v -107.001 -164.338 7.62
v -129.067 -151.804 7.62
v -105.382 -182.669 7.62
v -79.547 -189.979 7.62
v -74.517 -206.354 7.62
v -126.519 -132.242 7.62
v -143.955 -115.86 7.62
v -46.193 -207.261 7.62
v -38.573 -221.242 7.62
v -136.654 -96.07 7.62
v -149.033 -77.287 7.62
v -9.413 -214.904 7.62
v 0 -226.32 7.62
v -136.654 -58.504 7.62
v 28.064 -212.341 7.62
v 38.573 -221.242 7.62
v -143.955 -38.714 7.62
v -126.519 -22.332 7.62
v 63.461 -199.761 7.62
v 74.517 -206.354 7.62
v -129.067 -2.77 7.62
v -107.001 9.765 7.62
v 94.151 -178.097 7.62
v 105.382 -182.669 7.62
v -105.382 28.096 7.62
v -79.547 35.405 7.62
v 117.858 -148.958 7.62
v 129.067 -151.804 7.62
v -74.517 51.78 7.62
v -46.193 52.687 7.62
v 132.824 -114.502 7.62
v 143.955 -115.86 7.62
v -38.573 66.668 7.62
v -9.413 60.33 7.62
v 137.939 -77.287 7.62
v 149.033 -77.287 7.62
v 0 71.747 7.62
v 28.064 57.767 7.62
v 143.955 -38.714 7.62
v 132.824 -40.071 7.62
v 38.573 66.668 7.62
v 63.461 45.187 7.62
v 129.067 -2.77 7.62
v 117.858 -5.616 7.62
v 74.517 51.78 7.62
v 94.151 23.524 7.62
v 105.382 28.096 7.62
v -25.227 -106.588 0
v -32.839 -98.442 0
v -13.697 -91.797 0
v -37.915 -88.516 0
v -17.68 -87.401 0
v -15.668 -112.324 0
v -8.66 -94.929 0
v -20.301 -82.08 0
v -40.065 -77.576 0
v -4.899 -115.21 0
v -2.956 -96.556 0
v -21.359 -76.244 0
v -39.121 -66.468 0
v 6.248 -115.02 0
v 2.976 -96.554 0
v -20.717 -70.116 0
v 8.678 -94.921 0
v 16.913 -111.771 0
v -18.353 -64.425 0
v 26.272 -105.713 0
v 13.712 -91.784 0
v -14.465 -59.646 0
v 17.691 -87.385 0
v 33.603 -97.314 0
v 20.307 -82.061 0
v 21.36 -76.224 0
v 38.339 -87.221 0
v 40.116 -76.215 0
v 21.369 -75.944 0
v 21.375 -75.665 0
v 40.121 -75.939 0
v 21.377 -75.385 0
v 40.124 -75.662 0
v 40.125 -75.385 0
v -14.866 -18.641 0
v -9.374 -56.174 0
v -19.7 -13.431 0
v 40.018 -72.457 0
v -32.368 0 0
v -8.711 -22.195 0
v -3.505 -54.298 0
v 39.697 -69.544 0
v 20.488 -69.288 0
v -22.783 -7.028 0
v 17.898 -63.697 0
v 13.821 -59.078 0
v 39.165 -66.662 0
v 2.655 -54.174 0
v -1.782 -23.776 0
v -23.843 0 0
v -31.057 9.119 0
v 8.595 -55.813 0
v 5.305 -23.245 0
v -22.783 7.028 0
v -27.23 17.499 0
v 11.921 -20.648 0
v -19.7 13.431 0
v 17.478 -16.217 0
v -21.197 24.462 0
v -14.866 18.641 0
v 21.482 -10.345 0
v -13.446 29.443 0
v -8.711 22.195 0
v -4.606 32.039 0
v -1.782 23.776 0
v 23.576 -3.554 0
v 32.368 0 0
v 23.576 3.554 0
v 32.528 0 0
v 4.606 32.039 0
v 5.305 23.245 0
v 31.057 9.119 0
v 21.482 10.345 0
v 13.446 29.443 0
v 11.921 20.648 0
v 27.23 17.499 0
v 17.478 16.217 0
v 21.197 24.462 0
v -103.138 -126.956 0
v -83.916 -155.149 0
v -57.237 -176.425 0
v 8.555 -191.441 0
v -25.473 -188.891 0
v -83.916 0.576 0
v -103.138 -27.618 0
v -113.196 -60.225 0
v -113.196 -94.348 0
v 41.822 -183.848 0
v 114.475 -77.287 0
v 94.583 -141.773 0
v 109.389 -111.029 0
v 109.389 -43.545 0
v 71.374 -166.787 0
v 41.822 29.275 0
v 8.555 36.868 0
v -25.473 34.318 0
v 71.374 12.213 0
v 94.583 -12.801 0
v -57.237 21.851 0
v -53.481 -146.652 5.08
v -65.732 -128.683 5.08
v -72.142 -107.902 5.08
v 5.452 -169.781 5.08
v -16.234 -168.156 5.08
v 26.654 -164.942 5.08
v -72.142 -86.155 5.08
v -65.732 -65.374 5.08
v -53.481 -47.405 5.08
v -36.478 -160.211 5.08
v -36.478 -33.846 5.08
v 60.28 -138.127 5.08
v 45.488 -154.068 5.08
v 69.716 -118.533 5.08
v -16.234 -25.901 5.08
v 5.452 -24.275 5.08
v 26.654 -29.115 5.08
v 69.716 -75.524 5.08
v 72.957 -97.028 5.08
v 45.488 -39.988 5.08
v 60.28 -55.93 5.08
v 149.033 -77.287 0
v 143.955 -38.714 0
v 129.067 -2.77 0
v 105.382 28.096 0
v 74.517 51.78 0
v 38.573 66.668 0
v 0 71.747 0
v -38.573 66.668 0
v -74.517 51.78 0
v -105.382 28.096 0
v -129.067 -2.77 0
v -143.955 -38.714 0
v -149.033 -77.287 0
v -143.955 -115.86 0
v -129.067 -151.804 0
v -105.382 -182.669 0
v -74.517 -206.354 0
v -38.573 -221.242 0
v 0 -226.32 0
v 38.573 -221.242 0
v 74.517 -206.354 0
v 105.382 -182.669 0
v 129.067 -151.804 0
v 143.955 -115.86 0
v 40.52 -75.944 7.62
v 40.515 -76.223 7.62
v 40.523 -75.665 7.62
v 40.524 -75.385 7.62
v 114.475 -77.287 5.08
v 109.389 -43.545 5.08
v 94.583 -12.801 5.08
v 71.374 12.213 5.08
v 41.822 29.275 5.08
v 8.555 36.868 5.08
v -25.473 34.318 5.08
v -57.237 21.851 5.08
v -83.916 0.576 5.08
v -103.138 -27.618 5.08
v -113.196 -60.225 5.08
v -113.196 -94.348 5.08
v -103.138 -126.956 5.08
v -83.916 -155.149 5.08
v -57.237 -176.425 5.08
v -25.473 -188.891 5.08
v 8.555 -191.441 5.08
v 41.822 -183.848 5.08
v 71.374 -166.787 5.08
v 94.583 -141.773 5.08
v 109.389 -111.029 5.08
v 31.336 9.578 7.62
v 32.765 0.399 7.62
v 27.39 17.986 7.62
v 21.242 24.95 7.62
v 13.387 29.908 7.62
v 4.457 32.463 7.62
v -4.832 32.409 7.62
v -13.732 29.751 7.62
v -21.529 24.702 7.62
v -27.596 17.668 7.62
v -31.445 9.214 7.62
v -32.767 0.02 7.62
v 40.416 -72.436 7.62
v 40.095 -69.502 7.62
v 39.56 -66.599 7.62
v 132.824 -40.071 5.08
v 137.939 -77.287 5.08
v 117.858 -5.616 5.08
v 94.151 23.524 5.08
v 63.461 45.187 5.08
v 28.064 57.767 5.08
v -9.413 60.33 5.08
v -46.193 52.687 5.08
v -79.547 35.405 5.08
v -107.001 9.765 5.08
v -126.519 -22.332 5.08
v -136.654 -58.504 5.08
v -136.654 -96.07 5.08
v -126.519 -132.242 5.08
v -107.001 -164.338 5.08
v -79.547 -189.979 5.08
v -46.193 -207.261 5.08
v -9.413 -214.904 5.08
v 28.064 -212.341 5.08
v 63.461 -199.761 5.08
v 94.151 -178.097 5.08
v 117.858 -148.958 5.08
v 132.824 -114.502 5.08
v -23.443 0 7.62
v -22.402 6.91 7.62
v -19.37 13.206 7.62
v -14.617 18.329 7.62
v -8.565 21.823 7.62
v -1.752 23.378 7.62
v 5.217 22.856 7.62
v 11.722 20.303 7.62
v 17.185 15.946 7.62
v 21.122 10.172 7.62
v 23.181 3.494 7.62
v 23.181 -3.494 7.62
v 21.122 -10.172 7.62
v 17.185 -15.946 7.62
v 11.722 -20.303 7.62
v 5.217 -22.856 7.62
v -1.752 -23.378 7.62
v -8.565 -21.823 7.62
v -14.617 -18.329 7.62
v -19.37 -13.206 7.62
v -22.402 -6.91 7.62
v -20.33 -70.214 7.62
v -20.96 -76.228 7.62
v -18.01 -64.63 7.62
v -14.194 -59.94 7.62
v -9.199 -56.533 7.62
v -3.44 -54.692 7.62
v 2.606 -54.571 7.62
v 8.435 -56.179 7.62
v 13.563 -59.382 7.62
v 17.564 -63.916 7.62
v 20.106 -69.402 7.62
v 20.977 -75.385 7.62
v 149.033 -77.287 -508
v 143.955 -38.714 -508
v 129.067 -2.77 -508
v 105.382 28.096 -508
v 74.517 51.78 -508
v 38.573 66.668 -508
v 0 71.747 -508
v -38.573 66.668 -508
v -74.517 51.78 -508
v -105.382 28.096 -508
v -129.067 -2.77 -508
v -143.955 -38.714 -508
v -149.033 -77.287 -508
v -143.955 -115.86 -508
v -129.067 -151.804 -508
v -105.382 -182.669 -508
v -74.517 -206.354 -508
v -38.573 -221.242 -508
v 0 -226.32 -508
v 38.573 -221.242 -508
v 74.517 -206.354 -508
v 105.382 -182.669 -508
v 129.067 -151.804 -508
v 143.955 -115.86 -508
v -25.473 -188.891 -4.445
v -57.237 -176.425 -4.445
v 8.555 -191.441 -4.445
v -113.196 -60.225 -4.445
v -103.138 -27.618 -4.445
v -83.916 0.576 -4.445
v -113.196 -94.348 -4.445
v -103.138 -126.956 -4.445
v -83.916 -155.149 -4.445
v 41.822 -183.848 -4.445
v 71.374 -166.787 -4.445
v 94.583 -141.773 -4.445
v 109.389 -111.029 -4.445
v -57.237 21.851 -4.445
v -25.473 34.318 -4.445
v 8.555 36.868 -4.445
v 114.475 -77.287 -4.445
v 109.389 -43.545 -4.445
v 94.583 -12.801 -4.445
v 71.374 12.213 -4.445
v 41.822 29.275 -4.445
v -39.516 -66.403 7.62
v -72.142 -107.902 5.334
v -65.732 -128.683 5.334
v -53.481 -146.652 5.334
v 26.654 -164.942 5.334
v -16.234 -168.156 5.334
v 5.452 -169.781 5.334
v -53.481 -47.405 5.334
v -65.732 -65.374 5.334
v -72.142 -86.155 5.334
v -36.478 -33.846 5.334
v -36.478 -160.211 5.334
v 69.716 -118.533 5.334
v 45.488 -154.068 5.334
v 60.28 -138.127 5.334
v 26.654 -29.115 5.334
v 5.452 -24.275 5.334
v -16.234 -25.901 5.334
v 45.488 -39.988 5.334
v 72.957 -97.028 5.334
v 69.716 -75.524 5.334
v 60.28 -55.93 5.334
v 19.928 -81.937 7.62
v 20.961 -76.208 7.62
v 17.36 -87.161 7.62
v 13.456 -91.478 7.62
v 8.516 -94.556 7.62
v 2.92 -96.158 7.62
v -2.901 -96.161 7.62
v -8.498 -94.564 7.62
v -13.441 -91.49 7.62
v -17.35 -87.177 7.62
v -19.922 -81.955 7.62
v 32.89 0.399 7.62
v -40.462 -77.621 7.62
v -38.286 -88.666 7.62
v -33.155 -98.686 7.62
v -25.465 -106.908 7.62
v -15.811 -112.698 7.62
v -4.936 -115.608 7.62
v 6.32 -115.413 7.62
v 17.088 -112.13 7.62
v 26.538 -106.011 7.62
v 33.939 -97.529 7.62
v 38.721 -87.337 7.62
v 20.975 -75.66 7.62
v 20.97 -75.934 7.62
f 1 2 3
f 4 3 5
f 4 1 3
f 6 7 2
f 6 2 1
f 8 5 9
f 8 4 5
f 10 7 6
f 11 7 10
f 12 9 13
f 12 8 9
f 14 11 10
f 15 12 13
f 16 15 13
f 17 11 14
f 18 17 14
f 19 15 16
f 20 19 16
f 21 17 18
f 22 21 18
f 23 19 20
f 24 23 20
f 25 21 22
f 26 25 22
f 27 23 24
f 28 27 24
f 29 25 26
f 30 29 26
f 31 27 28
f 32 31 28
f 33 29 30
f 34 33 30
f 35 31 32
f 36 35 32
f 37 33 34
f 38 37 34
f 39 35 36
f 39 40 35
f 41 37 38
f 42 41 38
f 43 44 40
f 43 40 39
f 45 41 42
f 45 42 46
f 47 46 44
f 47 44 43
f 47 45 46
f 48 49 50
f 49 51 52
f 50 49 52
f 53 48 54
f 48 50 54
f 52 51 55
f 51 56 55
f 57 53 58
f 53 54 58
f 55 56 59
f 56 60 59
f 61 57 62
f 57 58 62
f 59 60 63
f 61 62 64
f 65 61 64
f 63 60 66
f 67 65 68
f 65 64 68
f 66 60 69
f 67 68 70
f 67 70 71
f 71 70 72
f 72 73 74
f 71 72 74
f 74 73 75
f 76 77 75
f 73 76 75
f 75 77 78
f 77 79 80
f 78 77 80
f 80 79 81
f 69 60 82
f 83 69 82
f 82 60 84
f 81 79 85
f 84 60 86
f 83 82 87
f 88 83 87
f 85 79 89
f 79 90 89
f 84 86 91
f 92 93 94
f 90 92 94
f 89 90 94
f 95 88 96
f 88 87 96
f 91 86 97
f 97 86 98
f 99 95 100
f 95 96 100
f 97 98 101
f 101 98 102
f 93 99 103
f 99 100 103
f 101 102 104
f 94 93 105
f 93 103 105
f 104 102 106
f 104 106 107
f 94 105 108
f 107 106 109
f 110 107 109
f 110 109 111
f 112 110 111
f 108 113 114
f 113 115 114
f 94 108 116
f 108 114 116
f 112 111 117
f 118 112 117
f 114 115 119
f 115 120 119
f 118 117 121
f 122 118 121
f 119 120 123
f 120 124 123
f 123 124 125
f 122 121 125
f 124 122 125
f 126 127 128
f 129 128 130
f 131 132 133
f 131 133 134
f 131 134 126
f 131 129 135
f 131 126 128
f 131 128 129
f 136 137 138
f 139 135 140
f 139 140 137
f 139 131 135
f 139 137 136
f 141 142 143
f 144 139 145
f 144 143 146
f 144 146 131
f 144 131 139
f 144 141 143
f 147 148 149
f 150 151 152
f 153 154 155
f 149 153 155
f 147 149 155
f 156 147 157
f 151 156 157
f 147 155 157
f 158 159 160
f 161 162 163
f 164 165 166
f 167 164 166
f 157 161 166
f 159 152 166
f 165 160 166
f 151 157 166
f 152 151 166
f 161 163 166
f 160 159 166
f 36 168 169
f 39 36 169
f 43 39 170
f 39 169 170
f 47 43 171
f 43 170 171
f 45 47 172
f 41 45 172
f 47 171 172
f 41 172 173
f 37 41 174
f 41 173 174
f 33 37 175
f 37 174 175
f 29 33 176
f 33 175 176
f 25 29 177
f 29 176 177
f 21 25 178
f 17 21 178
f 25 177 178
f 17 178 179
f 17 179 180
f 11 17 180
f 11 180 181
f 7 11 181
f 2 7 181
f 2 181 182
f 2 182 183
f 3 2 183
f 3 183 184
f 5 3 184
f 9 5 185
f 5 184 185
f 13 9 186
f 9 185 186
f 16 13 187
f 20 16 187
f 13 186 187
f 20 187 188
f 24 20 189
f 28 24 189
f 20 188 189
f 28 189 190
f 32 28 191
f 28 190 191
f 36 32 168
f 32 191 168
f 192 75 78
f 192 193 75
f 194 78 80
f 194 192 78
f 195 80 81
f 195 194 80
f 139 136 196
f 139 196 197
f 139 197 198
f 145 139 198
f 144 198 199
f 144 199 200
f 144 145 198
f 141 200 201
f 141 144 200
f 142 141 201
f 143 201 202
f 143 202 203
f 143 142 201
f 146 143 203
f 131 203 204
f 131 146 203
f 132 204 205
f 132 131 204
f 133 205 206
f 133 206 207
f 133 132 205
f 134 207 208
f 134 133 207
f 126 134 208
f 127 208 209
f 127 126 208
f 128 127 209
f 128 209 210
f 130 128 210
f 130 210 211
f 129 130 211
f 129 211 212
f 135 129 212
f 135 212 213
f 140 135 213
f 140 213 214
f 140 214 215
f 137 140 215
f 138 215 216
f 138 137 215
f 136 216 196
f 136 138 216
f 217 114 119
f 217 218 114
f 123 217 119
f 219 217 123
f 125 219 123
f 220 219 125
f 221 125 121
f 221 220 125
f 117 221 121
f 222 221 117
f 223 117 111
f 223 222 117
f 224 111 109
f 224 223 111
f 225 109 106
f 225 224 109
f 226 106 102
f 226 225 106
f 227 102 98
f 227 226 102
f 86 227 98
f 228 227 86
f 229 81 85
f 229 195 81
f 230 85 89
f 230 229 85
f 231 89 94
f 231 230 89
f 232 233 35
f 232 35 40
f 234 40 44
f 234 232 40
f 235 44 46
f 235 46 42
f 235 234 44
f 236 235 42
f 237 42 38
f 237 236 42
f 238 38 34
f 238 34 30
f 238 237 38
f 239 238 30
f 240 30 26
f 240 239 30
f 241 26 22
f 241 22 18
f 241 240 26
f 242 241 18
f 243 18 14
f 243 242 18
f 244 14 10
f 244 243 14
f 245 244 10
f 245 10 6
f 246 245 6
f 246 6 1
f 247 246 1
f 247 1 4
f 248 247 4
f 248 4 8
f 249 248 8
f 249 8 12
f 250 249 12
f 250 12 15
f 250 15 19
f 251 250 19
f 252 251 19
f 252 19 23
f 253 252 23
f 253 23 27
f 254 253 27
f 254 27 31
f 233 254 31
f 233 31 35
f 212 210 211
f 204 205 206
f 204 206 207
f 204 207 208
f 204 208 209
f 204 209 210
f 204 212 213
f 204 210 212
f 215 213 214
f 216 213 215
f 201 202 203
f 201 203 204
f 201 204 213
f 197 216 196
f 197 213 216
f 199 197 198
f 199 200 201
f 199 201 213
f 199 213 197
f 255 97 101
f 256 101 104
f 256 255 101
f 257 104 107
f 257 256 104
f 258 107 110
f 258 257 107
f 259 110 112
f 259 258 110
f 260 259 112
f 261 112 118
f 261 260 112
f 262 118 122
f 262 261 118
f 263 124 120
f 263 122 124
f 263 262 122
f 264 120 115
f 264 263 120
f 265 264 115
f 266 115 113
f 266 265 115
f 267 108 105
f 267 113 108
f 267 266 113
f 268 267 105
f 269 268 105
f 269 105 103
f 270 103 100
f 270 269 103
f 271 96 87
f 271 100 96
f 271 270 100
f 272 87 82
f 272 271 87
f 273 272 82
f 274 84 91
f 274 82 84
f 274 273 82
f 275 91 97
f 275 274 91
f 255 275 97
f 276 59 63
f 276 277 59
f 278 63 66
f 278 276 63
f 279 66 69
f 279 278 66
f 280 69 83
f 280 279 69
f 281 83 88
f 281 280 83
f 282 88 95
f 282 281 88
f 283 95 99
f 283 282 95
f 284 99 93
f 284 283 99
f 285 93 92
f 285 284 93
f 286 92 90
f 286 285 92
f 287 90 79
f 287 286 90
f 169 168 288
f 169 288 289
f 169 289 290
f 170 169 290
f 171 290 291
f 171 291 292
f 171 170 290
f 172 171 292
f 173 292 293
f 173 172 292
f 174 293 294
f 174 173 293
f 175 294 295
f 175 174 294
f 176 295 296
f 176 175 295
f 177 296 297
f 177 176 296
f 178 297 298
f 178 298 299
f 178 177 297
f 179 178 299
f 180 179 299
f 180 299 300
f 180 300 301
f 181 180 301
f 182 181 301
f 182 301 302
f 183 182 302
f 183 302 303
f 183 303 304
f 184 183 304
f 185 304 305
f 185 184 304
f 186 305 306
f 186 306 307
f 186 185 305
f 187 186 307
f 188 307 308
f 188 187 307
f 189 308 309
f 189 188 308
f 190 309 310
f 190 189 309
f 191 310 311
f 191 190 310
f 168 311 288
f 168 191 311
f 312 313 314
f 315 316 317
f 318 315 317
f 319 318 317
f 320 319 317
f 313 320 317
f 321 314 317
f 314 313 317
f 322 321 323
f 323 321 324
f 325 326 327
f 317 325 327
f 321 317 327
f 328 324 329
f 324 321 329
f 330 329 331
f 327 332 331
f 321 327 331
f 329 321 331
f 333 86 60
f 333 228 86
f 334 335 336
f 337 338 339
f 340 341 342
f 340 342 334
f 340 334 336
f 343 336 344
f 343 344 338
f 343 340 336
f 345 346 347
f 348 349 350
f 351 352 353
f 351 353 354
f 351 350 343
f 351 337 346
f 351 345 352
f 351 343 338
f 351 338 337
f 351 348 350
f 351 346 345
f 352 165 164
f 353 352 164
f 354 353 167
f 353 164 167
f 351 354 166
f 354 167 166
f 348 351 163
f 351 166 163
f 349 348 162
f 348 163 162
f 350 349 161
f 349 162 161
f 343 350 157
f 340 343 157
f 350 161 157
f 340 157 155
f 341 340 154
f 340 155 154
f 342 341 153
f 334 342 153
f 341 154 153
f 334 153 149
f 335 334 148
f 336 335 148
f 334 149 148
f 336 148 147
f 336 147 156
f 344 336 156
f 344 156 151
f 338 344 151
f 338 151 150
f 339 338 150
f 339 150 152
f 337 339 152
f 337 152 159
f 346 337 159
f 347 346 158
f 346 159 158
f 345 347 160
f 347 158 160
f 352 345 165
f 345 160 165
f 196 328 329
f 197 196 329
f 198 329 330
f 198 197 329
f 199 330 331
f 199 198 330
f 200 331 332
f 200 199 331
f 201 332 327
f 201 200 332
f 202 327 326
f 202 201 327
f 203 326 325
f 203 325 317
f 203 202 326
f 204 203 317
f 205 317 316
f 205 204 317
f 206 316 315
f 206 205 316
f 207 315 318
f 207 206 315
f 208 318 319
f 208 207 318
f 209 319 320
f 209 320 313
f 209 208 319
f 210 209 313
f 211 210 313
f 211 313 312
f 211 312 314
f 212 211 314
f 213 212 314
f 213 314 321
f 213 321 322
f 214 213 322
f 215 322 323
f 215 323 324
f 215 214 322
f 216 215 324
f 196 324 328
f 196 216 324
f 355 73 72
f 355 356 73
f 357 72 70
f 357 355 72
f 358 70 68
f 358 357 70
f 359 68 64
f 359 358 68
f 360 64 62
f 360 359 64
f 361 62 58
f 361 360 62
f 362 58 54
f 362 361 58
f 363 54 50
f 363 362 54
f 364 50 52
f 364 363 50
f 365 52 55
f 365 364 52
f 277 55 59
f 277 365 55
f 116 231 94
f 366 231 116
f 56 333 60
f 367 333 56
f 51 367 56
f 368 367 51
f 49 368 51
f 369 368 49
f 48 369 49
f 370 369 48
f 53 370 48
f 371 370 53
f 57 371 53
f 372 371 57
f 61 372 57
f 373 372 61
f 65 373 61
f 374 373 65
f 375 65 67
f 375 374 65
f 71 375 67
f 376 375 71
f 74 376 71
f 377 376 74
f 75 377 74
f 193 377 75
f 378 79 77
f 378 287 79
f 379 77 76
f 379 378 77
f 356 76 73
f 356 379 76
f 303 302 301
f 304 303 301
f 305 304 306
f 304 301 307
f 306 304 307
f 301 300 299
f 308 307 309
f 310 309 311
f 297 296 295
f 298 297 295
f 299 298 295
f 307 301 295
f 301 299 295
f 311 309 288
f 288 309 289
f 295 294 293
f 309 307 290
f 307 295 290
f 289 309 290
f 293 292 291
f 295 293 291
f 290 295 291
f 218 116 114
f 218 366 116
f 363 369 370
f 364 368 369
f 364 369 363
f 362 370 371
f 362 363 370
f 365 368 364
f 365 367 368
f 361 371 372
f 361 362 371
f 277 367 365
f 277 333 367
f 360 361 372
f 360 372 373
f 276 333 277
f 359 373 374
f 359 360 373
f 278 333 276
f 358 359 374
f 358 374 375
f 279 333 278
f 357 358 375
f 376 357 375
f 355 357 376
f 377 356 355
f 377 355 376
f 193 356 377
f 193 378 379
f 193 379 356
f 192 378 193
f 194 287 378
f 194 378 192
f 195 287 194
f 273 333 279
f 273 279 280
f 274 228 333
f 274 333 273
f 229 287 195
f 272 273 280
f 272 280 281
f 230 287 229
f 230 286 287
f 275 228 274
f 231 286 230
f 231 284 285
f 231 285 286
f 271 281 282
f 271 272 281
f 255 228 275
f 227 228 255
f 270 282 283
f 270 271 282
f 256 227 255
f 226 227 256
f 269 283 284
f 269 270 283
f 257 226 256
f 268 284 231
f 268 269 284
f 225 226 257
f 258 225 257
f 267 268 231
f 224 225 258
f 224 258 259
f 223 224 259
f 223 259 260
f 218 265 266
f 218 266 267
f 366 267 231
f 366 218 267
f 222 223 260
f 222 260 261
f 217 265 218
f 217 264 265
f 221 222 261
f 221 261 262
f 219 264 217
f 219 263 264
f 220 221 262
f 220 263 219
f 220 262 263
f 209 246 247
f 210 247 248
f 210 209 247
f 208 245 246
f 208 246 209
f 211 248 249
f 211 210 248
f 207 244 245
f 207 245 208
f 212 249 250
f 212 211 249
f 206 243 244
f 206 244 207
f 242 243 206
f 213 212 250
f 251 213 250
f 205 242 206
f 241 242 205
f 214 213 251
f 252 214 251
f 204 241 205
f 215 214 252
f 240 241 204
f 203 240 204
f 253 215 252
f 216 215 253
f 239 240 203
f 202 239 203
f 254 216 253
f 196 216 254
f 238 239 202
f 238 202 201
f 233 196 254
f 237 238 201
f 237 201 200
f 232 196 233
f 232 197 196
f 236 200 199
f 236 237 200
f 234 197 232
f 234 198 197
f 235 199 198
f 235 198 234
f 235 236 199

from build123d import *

# Parameters (mm, degrees)
F1_DEPTH  = 7.62
F1_TAPER  = -3
F2_R      = 149.0333442521
F3_DEPTH  = 508
F4_R      = 137.9387854388
F4_R_2    = 114.4747428545
F5_DEPTH  = 5.08
F6_DEPTH  = 7.62
F7_R      = 114.4747428545
F9_DEPTH  = 9.525
F8_R      = 72.9569658206
F10_DEPTH = 0.254


with BuildPart() as f1:
    # F0 (on Top) → F1 (new body)
    with BuildSketch(Plane.XY):
        with BuildLine():
            Line((32.3679885849, 0), (23.8426873423, 0))
            ThreePointArc((23.8426873423, 0), (0, -23.8426873423), (-23.8426873423, 0))
            Line((-23.8426873423, 0), (-32.3679885849, 0))
            ThreePointArc((-32.3679885849, 0), (0, -32.3679885849), (32.3679885849, 0))
        make_face()
        with BuildLine():
            ThreePointArc((-23.8426873423, 0), (0, 23.8426873423), (23.8426873423, 0))
            Line((23.8426873423, 0), (32.3679885849, 0))
            ThreePointArc((32.3679885849, 0), (0, 32.3679885849), (-32.3679885849, 0))
            Line((-32.3679885849, 0), (-23.8426873423, 0))
        make_face()
        with BuildLine():
            Line((32.5280141494, 0), (32.3679885849, 0))
            ThreePointArc((32.3679885849, 0), (0, -32.3679885849), (-32.3679885849, 0))
            Line((-32.3679885849, 0), (-39.121145443, -66.467749763))
            ThreePointArc((-39.121145443, -66.467749763), (0.0996109993, -35.2607797937), (39.1649394144, -66.6620986575))
            Line((39.1649394144, -66.6620986575), (32.5280141494, 0))
        make_face()
        with BuildLine():
            Line((-40.1152688385, -76.2523803411), (-39.121145443, -66.467749763))
            ThreePointArc((-39.121145443, -66.467749763), (-39.9191318284, -71.3294909522), (-40.1152688385, -76.2523803411))
        make_face()
        with BuildLine():
            ThreePointArc((39.1649394144, -66.6620986575), (0.0996109993, -35.2607797937), (-39.121145443, -66.467749763))
            Line((-39.121145443, -66.467749763), (-40.1152688385, -76.2523803411))
            Line((-40.1152688385, -76.2523803411), (-21.3592780933, -76.2436931517))
            ThreePointArc((-21.3592780933, -76.2436931517), (-0.4292857209, -54.0130857486), (21.3765200232, -75.3852948546))
            ThreePointArc((21.3765200232, -75.3852948546), (21.3724056453, -75.8046815905), (21.3600640955, -76.223906886))
            Line((21.3600640955, -76.223906886), (40.1160548408, -76.2152196967))
            Line((40.1160548408, -76.2152196967), (39.1649394144, -66.6620986575))
        make_face()
        with BuildLine():
            ThreePointArc((40.1246387053, -75.3852948546), (39.8839922472, -70.997380355), (39.1649394144, -66.6620986575))
            Line((39.1649394144, -66.6620986575), (40.1160548408, -76.2152196967))
            ThreePointArc((40.1160548408, -76.2152196967), (40.1224926818, -75.8002794707), (40.1246387053, -75.3852948546))
        make_face()
        with BuildLine():
            Line((-21.3592780933, -76.2436931517), (-40.1152688385, -76.2523803411))
            ThreePointArc((-40.1152688385, -76.2523803411), (0.018584478, -115.509929256), (40.1160548408, -76.2152196967))
            Line((40.1160548408, -76.2152196967), (21.3600640955, -76.223906886))
            ThreePointArc((21.3600640955, -76.223906886), (0.0099009357, -96.7618125849), (-21.3592780933, -76.2436931517))
        make_face()
    extrude(amount=F1_DEPTH, taper=F1_TAPER)


with BuildPart() as f3:
    # F2 (on Top) → F3 (new body)
    with BuildSketch(Plane.XY):
        with Locations((0, -77.2868394852)):
            Circle(F2_R)
    extrude(amount=-F3_DEPTH)

    # F4 (on face) → F5 (join)
    with BuildSketch(Plane.XY):
        with Locations((0, -77.2868394852)):
            Circle(F4_R)
        with Locations((0, -77.2868394852)):
            Circle(F4_R_2, mode=Mode.SUBTRACT)
    extrude(amount=F5_DEPTH)

    # F6 (add): a face of the model
    f6_faces = [f3.faces().sort_by_distance(p)[0] for p in [
        (-144.8180447183, -77.2868394852, 0),
    ]]
    extrude(f6_faces, amount=F6_DEPTH)


with BuildPart() as f9:
    # F7 (on face) → F9 (new body)
    with BuildSketch(Plane.XY.offset(5.08)):
        with Locations((0, -77.2868394852)):
            Circle(F7_R)
    extrude(amount=-F9_DEPTH)


with BuildPart() as f10:
    # F8 (on face) → F10 (new body)
    with BuildSketch(Plane.XY.offset(5.08)):
        with Locations((0, -97.0284342766)):
            Circle(F8_R)
    extrude(amount=F10_DEPTH)


solid = Compound([f1.part, f3.part, f9.part, f10.part])
